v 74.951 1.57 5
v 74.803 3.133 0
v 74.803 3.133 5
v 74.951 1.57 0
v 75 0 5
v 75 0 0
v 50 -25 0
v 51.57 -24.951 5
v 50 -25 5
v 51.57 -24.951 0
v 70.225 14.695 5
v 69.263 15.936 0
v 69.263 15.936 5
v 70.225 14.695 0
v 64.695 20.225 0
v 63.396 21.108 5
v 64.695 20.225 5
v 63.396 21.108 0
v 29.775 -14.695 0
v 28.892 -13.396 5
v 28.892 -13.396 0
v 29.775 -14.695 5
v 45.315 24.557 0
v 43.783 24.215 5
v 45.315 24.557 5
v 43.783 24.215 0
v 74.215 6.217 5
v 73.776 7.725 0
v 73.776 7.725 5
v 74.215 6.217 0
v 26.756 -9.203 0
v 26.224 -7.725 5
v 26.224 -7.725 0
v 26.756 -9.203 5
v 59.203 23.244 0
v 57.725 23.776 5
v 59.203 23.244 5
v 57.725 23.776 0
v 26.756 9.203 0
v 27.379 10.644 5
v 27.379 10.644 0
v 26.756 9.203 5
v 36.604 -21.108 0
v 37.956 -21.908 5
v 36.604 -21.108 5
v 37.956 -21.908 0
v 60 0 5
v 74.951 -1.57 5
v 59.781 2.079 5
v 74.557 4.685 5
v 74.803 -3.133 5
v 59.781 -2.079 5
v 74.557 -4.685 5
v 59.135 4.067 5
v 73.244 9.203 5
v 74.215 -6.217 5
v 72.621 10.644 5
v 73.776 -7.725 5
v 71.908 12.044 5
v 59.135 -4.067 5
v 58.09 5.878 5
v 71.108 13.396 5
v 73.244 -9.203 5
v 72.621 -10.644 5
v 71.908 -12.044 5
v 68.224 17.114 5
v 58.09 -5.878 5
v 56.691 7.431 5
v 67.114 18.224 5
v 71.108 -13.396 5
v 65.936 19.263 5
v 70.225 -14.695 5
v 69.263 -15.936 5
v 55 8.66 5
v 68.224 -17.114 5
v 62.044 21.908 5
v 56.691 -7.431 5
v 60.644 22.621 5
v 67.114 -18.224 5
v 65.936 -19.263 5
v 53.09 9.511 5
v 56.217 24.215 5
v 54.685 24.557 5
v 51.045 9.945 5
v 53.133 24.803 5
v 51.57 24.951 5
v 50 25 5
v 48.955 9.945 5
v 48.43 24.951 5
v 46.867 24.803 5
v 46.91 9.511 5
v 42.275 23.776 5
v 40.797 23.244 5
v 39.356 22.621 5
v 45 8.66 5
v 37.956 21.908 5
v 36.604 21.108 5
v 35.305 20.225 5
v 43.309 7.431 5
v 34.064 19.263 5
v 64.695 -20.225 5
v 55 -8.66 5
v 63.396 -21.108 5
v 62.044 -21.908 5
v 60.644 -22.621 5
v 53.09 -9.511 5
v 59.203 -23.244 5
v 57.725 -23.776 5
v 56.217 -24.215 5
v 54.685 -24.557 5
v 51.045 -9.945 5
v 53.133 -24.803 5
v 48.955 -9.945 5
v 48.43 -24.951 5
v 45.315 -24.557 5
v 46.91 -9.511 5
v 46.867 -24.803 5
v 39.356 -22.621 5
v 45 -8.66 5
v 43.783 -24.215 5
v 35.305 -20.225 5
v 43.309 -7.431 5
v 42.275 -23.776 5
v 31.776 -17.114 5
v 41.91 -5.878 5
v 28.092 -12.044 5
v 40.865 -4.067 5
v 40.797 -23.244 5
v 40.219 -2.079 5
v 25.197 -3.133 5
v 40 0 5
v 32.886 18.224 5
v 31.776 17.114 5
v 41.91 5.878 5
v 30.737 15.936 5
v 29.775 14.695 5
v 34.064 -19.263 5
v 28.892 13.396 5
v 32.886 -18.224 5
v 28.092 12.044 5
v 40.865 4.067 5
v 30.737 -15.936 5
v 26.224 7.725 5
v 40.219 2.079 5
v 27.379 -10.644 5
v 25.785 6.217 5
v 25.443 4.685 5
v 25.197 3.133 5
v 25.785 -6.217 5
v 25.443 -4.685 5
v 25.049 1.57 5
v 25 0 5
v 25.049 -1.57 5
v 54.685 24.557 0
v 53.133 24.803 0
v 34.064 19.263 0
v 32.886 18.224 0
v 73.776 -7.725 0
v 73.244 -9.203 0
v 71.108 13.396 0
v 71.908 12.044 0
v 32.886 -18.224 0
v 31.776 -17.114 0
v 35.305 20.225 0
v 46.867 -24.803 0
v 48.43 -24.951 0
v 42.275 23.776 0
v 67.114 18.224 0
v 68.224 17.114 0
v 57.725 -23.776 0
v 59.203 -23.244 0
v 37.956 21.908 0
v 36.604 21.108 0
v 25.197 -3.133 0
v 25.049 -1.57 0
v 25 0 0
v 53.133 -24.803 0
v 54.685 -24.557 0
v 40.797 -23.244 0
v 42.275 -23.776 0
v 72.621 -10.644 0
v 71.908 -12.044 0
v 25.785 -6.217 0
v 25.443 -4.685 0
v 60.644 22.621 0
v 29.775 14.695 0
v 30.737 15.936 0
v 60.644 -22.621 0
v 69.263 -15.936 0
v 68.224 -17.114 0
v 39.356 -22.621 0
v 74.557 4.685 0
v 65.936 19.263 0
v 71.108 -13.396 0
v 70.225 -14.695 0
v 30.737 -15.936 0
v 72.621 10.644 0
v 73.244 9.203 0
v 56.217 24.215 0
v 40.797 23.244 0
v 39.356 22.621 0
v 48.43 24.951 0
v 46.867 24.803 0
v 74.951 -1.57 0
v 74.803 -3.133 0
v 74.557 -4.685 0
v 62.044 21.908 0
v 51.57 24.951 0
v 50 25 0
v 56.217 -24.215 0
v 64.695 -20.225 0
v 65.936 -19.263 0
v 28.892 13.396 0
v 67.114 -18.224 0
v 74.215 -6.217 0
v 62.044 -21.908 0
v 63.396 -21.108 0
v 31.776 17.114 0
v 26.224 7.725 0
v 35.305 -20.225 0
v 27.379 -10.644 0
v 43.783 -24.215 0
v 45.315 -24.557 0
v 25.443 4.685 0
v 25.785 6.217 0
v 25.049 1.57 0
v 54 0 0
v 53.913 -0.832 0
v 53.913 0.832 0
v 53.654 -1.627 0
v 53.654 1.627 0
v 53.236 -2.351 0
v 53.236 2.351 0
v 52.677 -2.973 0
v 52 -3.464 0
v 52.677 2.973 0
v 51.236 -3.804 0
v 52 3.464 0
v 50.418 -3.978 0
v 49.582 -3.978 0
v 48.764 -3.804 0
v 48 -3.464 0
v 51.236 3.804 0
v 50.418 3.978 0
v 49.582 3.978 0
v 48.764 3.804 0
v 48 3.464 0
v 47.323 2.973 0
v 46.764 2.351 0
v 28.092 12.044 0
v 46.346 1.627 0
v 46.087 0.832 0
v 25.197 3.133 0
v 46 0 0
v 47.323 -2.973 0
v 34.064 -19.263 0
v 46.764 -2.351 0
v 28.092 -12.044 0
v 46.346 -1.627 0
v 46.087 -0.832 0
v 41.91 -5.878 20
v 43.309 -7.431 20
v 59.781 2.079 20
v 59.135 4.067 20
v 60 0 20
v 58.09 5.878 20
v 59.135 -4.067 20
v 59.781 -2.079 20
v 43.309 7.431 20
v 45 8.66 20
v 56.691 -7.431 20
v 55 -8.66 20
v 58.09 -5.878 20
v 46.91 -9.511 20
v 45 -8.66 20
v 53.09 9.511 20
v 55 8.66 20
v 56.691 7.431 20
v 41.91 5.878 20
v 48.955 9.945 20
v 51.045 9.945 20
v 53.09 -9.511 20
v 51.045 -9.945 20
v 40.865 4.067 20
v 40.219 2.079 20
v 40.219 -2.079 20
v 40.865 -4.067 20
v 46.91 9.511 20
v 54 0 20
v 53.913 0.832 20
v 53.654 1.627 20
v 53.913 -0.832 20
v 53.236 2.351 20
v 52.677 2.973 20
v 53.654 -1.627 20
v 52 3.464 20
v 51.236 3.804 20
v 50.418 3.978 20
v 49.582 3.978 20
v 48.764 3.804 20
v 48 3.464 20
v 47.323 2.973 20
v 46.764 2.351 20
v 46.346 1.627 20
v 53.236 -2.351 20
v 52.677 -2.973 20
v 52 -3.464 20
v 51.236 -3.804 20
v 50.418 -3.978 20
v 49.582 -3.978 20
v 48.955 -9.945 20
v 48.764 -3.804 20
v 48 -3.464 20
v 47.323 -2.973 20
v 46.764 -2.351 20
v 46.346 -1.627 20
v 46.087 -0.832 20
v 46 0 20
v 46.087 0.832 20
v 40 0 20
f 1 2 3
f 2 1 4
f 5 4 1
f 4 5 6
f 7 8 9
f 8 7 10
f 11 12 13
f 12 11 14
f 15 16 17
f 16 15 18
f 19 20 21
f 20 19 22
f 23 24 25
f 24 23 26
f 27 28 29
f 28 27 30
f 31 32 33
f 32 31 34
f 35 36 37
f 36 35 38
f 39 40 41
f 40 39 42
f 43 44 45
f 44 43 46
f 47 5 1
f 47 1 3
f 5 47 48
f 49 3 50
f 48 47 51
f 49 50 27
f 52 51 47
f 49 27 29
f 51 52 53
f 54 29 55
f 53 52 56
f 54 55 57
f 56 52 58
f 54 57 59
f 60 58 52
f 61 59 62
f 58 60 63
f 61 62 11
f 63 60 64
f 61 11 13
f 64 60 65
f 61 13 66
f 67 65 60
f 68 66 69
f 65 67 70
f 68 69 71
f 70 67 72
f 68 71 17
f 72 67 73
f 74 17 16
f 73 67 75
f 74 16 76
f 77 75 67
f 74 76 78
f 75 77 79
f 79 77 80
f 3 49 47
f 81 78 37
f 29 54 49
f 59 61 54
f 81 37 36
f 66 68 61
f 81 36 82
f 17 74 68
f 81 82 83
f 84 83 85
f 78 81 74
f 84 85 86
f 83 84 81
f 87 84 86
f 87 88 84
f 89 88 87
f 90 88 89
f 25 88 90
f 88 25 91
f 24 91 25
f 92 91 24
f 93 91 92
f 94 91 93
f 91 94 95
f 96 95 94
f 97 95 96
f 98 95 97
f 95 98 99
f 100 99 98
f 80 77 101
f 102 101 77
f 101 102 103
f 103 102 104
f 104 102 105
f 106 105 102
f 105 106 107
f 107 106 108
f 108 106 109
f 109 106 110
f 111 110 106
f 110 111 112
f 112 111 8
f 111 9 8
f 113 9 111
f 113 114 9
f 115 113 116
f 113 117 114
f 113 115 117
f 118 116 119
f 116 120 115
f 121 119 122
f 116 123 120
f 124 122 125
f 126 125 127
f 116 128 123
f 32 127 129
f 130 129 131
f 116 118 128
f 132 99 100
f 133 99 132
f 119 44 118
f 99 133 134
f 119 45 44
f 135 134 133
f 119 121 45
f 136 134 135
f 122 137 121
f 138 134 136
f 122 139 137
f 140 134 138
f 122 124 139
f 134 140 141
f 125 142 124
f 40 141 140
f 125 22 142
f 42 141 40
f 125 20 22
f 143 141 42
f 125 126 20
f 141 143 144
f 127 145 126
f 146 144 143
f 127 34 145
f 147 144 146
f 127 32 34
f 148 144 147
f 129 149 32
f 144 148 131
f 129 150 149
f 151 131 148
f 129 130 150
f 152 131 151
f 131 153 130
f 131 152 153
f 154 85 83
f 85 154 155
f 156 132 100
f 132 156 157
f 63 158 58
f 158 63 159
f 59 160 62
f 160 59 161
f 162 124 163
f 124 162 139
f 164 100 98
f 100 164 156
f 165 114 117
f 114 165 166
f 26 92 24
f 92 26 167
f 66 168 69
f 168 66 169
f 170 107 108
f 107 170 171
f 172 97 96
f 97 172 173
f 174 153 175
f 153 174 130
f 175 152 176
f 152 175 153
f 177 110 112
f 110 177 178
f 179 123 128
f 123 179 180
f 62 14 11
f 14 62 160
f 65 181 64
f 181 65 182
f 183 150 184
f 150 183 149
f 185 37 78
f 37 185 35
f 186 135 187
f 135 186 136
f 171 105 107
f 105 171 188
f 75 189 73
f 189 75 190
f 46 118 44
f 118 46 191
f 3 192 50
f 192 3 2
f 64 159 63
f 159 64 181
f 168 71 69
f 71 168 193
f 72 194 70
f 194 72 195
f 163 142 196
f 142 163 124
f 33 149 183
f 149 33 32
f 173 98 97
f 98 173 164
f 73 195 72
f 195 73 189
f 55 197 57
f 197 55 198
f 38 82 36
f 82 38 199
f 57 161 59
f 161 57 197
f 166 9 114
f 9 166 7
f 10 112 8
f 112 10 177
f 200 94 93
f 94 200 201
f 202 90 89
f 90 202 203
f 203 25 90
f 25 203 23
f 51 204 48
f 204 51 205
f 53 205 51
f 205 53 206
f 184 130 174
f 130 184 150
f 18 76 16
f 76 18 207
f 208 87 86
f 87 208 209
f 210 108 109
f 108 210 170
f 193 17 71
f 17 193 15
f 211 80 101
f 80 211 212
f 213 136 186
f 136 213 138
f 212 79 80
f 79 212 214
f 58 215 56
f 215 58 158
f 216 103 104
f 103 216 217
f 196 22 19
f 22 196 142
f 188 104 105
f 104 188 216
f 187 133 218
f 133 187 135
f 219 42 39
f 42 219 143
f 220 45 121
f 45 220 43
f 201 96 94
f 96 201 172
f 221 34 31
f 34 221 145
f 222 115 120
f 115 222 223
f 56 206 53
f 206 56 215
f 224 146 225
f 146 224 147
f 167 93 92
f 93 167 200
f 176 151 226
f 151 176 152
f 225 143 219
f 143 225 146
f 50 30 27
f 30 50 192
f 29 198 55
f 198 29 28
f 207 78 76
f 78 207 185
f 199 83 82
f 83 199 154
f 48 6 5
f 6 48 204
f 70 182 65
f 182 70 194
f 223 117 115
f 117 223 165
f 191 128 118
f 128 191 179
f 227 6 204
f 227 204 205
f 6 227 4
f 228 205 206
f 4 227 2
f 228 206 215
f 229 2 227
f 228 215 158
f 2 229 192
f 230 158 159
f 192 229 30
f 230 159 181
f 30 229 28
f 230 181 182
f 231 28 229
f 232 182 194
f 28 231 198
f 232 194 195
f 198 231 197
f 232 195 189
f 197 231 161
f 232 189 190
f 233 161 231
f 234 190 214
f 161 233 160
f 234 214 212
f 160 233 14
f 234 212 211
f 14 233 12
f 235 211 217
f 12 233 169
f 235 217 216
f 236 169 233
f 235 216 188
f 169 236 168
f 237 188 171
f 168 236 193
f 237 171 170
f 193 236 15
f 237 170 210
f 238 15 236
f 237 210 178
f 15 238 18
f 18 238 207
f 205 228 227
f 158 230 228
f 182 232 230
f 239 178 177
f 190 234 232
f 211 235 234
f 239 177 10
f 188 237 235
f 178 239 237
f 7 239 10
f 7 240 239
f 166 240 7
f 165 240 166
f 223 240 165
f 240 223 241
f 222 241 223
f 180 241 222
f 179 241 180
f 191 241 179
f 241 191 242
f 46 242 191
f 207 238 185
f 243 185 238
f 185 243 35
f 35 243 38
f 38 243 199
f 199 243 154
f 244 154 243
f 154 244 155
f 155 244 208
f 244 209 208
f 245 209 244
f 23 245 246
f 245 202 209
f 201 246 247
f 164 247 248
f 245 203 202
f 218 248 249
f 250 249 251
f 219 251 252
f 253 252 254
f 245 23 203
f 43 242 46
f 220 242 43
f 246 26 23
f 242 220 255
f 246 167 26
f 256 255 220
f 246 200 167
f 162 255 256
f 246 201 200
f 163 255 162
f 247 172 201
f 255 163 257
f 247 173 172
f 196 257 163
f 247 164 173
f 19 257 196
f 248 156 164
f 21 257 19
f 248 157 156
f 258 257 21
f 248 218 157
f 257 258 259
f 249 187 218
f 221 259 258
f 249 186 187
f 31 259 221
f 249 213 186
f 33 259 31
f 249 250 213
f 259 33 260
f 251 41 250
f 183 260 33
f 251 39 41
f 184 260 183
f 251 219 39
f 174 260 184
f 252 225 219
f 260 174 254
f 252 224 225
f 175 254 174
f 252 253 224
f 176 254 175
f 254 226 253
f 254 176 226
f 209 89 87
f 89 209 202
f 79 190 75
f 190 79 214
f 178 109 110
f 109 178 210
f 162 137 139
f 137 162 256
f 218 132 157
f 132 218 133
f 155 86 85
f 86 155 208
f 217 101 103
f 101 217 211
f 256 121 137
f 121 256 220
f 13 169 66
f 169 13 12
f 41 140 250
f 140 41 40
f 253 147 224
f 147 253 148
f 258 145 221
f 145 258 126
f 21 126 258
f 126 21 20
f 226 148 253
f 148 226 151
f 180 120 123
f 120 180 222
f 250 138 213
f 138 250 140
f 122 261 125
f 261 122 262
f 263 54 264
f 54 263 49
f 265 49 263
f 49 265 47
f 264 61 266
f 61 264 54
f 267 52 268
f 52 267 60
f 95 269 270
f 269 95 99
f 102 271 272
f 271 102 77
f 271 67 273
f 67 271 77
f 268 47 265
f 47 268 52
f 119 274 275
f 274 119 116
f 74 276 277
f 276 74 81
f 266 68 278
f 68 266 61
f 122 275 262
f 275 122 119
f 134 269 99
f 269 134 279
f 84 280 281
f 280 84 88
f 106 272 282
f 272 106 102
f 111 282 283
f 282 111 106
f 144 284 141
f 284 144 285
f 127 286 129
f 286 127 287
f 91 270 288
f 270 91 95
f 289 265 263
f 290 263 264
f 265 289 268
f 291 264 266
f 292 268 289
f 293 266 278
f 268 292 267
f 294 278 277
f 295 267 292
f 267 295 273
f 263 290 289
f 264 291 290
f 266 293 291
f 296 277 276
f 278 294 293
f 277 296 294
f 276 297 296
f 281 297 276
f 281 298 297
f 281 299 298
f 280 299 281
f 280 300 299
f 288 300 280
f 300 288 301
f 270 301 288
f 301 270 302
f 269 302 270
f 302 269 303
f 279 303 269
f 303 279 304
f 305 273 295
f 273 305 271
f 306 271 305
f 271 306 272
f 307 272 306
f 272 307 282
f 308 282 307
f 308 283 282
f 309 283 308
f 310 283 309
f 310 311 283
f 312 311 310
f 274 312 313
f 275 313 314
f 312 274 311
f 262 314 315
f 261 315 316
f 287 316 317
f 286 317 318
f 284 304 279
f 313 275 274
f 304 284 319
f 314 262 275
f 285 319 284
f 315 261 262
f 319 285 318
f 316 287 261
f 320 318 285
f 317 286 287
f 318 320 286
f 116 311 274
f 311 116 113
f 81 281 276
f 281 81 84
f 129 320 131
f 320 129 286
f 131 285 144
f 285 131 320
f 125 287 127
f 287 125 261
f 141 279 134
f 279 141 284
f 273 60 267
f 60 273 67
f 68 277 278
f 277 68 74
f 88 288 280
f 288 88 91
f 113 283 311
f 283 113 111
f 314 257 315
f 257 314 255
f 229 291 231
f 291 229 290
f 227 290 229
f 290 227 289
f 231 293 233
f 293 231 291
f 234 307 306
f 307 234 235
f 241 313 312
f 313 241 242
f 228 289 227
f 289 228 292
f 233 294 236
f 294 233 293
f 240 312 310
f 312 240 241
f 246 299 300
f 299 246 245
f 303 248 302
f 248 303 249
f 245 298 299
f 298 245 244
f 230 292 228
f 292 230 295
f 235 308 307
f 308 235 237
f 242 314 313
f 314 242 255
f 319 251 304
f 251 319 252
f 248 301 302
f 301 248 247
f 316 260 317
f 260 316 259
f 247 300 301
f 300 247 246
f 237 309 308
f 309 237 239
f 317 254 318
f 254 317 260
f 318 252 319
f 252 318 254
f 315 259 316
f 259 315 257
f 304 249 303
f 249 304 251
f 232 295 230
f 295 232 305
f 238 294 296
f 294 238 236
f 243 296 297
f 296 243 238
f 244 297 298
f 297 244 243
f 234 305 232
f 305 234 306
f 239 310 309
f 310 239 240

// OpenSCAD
// Vamos a hacer una rueda de un robot que va a tener un porta ejes
translate([50,0,0]) // Podemos aplicar una translación a la unión de los cilindros
difference() {
    union(){    // Con el operador Union los pegamos lo que será la rueda y el portaeje
        cylinder(r=50/2, h=5, $fn=100);     // Rueda
        cylinder(r=20/2, h=20, fn=80);      // Porta Eje
    }

    cylinder(r=8/2, h=80 , $fn=30, center=true);    // Taladro del portaeje
}
